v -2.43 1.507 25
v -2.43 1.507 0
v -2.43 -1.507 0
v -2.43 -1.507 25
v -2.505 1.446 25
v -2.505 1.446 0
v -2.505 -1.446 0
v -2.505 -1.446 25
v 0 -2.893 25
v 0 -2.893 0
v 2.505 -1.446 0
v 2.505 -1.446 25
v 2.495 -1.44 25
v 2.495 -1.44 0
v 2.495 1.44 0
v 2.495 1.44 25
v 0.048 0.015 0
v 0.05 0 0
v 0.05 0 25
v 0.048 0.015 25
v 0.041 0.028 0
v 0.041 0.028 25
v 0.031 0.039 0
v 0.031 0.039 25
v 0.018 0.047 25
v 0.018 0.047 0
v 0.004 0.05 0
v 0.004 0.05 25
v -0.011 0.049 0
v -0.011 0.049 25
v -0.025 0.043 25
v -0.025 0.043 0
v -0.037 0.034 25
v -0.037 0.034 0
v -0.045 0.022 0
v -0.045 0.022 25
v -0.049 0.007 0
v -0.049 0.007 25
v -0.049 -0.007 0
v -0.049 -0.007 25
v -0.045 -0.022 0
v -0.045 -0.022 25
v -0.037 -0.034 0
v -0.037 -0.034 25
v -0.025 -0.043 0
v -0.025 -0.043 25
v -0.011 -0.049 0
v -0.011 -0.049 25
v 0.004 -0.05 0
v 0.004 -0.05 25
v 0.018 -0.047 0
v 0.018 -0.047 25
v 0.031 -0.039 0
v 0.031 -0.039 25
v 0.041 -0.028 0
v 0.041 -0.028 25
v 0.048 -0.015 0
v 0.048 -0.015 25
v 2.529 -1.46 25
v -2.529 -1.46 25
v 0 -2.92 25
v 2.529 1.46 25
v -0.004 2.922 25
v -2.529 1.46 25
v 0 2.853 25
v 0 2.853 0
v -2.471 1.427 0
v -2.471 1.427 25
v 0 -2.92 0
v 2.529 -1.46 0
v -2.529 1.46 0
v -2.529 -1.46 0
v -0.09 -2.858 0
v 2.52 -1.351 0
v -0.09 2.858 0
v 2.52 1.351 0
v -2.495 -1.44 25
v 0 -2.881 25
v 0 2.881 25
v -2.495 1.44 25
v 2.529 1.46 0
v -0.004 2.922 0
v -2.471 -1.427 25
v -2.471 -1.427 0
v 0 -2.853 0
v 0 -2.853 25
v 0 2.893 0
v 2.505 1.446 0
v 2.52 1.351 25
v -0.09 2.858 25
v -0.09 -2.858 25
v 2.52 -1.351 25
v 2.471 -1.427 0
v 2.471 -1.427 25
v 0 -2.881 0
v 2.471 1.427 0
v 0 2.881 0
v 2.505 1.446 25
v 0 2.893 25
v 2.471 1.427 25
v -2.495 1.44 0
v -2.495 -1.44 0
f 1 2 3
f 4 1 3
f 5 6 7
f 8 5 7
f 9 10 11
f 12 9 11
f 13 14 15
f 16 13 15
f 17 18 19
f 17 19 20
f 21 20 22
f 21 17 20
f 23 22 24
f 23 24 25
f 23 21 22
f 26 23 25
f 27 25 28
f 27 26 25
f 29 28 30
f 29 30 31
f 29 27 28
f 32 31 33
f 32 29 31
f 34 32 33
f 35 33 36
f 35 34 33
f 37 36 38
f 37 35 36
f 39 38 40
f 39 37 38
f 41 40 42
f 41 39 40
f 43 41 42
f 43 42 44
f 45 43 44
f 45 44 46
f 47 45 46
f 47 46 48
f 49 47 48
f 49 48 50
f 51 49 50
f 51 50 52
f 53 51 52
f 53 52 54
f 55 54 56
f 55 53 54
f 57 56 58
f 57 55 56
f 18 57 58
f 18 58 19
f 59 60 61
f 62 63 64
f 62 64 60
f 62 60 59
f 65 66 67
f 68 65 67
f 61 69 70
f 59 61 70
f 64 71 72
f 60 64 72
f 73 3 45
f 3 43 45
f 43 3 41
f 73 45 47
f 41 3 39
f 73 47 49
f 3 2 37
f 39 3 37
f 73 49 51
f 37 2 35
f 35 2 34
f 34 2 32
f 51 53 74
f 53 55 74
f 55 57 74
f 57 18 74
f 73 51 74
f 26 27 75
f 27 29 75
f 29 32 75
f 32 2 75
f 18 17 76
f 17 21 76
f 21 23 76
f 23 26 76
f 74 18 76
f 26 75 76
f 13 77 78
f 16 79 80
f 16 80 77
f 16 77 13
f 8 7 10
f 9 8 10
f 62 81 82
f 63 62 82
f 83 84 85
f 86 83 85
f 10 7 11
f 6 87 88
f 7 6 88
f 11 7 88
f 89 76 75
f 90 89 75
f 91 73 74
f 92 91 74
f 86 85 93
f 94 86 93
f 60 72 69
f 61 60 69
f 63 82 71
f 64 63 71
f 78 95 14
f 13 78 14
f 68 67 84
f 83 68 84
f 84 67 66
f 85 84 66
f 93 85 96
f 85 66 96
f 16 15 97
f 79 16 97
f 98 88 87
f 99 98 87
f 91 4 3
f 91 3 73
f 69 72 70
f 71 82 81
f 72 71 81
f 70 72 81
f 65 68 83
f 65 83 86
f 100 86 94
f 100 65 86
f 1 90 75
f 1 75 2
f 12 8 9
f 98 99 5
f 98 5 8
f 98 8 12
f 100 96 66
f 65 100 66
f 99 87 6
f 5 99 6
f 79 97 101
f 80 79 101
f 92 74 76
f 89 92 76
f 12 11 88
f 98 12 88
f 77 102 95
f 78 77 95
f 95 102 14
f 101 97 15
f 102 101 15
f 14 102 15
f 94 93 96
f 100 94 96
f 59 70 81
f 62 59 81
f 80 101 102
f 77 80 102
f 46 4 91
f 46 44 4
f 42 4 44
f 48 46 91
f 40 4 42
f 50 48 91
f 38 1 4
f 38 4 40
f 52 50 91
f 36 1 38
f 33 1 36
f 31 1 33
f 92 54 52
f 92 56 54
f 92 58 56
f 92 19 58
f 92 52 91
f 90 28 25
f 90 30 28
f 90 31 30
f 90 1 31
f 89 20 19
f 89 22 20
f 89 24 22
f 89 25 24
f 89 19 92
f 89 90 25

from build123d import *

# Parameters (mm, degrees)
F1_DEPTH = 25
F3_DEPTH = 25
F5_DEPTH = 25
F7_DEPTH = 25
F8_R     = 0.05
F9_DEPTH = 25


with BuildPart() as f1:
    # F0 (on Top) → F1 (new body)
    with BuildSketch(Plane.XY):
        Polygon((2.529, -1.460119), (2.529, 1.460119), (-0.00375, 2.922403), (-2.529, 1.460119), (-2.529, -1.460119), (0, -2.920238), align=None)
    extrude(amount=F1_DEPTH)


with BuildPart() as f3:
    # F2 (on Top) → F3 (new body)
    with BuildSketch(Plane.XY):
        Polygon((2.505, -1.446262), (2.505, 1.446262), (0, 2.892525), (-2.505, 1.446262), (-2.505, -1.446262), (0, -2.892525), align=None)
    extrude(amount=F3_DEPTH)


with BuildPart() as f5:
    # F4 (on Top) → F5 (new body)
    with BuildSketch(Plane.XY):
        Polygon((2.471, -1.426633), (2.471, 1.426633), (0, 2.853265), (-2.471, 1.426633), (-2.471, -1.426633), (0, -2.853265), align=None)
    extrude(amount=F5_DEPTH)


with BuildPart() as f7:
    # F6 (on Top) → F7 (new body)
    with BuildSketch(Plane.XY):
        Polygon((2.495, -1.440489), (2.495, 1.440489), (0, 2.880978), (-2.495, 1.440489), (-2.495, -1.440489), (0, -2.880978), align=None)
    extrude(amount=F7_DEPTH)


with BuildPart() as f9:
    # F8 (on Top) → F9 (new body)
    with BuildSketch(Plane.XY):
        Polygon((2.52, 1.351), (-0.09, 2.857884), (-2.43, 1.506884), (-2.43, -1.506884), (-0.09, -2.857884), (2.52, -1.351), align=None)
        Circle(F8_R, mode=Mode.SUBTRACT)
    extrude(amount=F9_DEPTH)


solid = Compound([f1.part, f3.part, f5.part, f7.part, f9.part])
